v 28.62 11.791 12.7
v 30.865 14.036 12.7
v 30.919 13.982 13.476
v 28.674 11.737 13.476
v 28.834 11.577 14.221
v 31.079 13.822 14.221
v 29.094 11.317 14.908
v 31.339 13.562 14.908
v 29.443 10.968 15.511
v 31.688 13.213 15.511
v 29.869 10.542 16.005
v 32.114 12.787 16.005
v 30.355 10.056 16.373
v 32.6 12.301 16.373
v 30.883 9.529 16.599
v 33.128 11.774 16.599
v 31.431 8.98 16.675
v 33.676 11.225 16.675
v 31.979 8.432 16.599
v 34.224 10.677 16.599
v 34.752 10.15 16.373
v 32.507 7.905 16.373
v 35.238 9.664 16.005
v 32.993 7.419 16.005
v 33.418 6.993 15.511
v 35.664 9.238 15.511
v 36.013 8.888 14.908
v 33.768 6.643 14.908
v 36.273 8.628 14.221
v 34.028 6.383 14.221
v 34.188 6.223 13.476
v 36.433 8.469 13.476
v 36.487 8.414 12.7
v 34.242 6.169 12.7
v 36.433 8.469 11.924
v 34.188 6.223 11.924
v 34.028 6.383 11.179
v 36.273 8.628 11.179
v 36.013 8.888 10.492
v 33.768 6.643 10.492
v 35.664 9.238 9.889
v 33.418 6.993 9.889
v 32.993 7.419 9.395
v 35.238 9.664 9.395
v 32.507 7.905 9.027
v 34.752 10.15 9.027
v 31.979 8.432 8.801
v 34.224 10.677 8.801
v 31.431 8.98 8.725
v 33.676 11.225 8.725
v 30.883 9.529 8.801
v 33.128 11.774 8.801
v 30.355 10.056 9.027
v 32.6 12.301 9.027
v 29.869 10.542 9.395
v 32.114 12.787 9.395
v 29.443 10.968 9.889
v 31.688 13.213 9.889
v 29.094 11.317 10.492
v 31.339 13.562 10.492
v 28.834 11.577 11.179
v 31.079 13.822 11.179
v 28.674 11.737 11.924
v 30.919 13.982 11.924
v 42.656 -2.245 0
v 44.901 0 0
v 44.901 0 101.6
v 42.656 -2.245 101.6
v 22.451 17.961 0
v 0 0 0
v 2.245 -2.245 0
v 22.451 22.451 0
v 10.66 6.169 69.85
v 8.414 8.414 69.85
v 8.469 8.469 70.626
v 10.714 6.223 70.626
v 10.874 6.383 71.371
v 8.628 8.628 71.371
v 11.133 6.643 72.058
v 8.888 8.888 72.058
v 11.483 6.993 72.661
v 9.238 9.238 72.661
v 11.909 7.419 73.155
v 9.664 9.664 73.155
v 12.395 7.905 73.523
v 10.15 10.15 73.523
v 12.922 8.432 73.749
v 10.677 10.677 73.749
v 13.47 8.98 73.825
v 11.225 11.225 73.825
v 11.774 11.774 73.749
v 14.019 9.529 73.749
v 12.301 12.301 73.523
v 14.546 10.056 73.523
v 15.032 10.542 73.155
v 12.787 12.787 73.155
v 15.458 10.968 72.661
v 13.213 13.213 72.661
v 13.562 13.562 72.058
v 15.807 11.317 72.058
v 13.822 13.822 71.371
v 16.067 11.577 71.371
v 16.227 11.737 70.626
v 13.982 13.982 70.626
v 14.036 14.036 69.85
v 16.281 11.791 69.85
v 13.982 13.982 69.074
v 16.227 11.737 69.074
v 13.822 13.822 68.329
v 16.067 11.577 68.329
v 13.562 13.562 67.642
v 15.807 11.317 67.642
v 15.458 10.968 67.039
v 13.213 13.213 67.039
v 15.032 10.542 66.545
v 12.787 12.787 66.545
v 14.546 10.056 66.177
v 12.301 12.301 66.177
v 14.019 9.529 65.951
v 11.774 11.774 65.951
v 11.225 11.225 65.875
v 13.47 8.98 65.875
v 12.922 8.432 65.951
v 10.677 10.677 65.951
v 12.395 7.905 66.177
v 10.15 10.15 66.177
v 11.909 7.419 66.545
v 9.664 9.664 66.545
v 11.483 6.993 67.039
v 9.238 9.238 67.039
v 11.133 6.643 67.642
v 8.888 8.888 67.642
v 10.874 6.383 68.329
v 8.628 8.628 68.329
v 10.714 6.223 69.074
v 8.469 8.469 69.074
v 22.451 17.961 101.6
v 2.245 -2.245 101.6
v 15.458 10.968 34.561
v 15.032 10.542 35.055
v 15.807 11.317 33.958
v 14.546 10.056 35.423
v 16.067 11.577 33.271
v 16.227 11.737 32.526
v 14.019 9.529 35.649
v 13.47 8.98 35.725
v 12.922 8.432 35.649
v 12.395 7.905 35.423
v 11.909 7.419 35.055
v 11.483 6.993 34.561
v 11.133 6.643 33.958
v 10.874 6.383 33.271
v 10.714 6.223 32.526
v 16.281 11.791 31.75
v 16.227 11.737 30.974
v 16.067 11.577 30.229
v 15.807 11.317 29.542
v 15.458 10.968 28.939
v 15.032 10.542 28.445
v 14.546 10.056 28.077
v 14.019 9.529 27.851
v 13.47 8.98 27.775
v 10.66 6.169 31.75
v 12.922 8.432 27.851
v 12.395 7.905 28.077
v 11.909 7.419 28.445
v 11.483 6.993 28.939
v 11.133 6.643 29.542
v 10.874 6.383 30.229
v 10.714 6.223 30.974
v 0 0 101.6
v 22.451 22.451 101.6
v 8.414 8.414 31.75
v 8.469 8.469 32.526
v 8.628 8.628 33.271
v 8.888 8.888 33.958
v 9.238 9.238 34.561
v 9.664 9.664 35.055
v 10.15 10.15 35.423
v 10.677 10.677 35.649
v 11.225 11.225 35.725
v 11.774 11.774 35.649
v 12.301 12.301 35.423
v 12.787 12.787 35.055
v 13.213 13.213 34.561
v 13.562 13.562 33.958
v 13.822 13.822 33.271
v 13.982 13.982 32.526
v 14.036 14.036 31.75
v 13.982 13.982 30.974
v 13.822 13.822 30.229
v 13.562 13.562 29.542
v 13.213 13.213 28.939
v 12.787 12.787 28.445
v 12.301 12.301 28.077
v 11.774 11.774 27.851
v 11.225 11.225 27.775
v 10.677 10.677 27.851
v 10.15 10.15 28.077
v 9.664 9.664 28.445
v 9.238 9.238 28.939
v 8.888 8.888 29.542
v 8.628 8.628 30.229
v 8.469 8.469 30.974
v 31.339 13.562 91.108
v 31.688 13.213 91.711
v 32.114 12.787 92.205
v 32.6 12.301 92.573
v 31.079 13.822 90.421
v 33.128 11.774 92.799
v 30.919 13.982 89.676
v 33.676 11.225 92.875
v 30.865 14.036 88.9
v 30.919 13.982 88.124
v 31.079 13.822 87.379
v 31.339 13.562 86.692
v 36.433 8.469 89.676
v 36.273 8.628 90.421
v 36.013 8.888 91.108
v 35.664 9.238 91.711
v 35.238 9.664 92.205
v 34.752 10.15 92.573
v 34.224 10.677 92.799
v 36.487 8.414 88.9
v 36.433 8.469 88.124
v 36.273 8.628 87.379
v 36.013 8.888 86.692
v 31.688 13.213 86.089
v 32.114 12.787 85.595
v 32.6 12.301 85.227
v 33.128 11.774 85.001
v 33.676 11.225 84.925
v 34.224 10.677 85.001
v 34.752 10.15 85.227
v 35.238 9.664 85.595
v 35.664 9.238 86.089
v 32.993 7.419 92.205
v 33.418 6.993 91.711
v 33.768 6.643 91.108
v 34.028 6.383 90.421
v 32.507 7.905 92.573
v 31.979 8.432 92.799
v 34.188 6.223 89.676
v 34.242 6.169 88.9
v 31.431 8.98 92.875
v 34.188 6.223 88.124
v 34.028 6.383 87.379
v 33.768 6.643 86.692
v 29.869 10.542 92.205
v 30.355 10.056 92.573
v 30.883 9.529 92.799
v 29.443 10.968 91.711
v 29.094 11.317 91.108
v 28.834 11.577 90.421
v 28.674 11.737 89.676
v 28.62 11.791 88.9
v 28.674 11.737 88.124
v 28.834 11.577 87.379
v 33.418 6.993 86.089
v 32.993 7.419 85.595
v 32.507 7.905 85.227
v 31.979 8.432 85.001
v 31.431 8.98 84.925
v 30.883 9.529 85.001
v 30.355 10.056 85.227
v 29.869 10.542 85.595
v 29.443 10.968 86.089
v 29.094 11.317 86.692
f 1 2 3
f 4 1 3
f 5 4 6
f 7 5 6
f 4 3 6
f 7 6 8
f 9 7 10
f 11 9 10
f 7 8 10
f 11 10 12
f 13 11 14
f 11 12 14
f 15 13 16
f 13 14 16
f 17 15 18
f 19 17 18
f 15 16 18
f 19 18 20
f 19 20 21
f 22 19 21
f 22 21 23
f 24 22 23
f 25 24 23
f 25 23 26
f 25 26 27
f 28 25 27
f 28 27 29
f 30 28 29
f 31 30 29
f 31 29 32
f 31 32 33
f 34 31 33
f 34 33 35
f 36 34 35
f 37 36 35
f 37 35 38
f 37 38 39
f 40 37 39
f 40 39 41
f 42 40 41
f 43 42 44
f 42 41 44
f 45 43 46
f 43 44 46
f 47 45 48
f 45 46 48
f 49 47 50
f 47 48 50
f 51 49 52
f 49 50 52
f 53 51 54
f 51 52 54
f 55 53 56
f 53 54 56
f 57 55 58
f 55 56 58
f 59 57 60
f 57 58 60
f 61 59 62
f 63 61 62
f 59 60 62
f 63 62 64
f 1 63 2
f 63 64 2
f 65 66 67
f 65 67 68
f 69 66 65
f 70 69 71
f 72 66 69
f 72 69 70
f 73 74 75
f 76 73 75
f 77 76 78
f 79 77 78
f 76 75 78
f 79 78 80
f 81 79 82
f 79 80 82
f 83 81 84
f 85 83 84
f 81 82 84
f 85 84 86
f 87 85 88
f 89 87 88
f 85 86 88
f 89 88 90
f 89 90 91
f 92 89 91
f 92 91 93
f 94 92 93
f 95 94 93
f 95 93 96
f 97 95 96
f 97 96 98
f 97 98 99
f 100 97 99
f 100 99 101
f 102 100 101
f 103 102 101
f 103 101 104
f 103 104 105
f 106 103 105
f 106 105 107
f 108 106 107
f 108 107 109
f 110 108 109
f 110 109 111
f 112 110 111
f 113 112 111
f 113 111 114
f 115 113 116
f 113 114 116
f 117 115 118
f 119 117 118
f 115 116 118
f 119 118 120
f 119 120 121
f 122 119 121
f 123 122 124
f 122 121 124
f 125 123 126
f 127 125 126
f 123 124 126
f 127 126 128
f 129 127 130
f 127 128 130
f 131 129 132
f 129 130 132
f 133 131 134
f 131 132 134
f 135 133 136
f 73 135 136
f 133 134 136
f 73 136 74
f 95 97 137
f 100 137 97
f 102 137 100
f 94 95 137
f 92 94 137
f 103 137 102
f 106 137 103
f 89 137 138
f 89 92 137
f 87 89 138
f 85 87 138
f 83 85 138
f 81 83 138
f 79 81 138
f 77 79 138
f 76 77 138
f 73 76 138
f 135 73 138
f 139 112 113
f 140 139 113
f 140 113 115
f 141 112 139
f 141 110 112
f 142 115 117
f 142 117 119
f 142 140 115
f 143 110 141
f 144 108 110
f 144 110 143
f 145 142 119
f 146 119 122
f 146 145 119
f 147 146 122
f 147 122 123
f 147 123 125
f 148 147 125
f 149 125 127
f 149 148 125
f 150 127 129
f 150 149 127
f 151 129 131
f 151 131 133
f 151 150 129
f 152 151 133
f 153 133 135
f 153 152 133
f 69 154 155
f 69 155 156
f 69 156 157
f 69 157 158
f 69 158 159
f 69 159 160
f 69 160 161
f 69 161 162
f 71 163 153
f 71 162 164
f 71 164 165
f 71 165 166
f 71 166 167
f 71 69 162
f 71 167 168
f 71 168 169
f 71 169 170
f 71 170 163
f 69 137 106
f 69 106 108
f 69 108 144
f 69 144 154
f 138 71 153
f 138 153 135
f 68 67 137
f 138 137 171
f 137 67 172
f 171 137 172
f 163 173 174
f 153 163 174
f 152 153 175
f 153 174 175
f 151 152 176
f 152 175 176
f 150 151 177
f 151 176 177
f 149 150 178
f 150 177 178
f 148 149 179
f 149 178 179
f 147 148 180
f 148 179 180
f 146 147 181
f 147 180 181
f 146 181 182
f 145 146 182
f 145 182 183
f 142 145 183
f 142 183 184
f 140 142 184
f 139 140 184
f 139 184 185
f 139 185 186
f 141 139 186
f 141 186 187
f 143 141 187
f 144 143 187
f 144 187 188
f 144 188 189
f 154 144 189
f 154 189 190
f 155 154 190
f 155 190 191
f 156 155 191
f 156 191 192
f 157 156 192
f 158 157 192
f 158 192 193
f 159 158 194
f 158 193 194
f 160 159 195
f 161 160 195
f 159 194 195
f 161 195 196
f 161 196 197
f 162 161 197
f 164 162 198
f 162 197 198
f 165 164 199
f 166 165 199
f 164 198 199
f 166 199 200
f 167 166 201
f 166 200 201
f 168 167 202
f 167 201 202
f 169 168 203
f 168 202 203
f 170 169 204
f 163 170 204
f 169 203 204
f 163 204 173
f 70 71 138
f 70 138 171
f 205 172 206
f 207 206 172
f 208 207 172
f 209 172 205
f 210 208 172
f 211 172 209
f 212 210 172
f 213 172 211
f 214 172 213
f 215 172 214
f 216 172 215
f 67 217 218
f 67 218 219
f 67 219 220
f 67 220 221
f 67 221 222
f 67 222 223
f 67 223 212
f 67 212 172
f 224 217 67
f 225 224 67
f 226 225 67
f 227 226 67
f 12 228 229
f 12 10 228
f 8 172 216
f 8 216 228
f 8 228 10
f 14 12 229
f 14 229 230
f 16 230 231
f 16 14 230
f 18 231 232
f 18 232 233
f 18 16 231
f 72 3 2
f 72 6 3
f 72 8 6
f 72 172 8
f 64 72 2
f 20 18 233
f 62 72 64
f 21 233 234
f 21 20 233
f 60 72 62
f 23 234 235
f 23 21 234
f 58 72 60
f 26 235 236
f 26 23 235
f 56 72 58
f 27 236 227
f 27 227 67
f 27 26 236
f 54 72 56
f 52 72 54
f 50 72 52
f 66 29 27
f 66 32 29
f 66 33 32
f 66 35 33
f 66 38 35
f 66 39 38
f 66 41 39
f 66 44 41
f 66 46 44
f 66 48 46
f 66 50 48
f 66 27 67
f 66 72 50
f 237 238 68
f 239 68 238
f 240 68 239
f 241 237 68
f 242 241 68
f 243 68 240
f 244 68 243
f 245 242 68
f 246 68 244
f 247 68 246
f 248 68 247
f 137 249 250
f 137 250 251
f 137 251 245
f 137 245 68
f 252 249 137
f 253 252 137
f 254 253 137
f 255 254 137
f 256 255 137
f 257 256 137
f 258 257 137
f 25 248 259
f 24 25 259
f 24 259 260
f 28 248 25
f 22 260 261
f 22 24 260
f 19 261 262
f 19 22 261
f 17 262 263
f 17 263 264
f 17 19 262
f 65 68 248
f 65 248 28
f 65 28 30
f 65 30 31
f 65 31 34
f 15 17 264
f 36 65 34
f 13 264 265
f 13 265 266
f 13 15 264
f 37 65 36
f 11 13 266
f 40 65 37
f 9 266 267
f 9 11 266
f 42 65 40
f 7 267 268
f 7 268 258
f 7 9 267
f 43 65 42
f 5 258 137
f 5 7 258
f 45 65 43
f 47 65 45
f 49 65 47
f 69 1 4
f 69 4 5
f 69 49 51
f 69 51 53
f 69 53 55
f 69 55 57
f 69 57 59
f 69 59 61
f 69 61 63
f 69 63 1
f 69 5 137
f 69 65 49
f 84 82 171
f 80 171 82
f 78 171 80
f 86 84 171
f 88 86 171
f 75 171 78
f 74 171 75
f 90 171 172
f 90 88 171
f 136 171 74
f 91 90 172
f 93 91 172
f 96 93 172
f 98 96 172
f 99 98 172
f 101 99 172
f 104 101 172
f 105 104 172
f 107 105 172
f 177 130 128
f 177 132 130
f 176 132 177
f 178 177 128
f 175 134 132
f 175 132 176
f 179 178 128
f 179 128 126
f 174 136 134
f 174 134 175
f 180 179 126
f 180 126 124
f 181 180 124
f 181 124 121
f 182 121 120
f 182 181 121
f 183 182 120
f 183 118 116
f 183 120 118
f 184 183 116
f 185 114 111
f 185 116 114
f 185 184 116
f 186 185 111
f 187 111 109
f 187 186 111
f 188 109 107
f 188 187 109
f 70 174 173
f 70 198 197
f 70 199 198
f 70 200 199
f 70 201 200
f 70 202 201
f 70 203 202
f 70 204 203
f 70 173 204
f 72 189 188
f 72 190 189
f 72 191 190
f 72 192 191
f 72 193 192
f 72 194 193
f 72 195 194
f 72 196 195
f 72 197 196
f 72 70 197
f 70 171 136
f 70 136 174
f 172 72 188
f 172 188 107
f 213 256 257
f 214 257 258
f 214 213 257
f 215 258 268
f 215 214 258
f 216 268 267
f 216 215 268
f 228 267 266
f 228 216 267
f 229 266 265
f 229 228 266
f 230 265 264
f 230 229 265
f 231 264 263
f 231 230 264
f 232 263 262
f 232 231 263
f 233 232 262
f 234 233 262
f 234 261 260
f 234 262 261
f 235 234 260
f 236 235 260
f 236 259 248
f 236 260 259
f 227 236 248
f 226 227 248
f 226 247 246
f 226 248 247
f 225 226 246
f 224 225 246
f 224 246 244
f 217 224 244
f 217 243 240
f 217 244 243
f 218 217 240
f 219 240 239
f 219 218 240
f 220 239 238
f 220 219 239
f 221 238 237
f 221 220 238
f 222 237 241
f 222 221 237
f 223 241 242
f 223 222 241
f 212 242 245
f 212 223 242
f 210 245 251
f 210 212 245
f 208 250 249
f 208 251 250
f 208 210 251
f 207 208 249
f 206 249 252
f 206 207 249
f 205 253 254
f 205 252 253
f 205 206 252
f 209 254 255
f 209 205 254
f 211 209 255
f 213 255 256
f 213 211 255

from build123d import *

# Parameters (mm, degrees)
BOSS_EXTRUDE1_DEPTH     = 101.6
SKETCH4_R               = 3.9751
CUT_EXTRUDE3_DEPTH      = 114.32570869
ESQUISSE1_R             = 3.9751
ENL_V_MAT_EXTRU_1_DEPTH = 107.941428186


with BuildPart() as part:
    # Sketch1 → Boss-Extrude1 (new body)
    with BuildSketch(Plane.XY):
        Polygon((0, 0), (22.450640303, 22.450640303), (44.901280605, 0), (42.656216575, -2.24506403), (22.450640303, 17.960512242), (2.24506403, -2.24506403), align=None)
    extrude(amount=BOSS_EXTRUDE1_DEPTH)

    # Sketch4 → Cut-Extrude3 (cut, through all)
    with BuildSketch(Plane(origin=(0, 0, 0), x_dir=(0, 0, 1), z_dir=(-0.7071067811865476, 0.7071067811865475, 0))):
        with Locations(Location((31.75, 15.875, 0), (0, 0, 270))):
            Circle(SKETCH4_R)
        with Locations(Location((69.85, 15.875, 0), (0, 0, 270))):
            Circle(SKETCH4_R)
    extrude(amount=-CUT_EXTRUDE3_DEPTH, mode=Mode.SUBTRACT)

    # Esquisse1 → Enlèv. mat.-Extru.1 (cut, through all)
    with BuildSketch(Plane(origin=(22.450640303, 22.450640303, 0), x_dir=(-0.7071067811865476, 0.7071067811865475, 0), z_dir=(0.7071067811865475, 0.7071067811865476, 0))):
        with Locations((-15.875, 12.7)):
            Circle(ESQUISSE1_R)
    enl_v_mat_extru_1 = extrude(amount=-ENL_V_MAT_EXTRU_1_DEPTH, mode=Mode.SUBTRACT)

    # Symétrie1: Enlèv. mat.-Extru.1 across plane
    add(enl_v_mat_extru_1.mirror(Plane.XY.offset(50.8)), mode=Mode.SUBTRACT)


solid = part.part
